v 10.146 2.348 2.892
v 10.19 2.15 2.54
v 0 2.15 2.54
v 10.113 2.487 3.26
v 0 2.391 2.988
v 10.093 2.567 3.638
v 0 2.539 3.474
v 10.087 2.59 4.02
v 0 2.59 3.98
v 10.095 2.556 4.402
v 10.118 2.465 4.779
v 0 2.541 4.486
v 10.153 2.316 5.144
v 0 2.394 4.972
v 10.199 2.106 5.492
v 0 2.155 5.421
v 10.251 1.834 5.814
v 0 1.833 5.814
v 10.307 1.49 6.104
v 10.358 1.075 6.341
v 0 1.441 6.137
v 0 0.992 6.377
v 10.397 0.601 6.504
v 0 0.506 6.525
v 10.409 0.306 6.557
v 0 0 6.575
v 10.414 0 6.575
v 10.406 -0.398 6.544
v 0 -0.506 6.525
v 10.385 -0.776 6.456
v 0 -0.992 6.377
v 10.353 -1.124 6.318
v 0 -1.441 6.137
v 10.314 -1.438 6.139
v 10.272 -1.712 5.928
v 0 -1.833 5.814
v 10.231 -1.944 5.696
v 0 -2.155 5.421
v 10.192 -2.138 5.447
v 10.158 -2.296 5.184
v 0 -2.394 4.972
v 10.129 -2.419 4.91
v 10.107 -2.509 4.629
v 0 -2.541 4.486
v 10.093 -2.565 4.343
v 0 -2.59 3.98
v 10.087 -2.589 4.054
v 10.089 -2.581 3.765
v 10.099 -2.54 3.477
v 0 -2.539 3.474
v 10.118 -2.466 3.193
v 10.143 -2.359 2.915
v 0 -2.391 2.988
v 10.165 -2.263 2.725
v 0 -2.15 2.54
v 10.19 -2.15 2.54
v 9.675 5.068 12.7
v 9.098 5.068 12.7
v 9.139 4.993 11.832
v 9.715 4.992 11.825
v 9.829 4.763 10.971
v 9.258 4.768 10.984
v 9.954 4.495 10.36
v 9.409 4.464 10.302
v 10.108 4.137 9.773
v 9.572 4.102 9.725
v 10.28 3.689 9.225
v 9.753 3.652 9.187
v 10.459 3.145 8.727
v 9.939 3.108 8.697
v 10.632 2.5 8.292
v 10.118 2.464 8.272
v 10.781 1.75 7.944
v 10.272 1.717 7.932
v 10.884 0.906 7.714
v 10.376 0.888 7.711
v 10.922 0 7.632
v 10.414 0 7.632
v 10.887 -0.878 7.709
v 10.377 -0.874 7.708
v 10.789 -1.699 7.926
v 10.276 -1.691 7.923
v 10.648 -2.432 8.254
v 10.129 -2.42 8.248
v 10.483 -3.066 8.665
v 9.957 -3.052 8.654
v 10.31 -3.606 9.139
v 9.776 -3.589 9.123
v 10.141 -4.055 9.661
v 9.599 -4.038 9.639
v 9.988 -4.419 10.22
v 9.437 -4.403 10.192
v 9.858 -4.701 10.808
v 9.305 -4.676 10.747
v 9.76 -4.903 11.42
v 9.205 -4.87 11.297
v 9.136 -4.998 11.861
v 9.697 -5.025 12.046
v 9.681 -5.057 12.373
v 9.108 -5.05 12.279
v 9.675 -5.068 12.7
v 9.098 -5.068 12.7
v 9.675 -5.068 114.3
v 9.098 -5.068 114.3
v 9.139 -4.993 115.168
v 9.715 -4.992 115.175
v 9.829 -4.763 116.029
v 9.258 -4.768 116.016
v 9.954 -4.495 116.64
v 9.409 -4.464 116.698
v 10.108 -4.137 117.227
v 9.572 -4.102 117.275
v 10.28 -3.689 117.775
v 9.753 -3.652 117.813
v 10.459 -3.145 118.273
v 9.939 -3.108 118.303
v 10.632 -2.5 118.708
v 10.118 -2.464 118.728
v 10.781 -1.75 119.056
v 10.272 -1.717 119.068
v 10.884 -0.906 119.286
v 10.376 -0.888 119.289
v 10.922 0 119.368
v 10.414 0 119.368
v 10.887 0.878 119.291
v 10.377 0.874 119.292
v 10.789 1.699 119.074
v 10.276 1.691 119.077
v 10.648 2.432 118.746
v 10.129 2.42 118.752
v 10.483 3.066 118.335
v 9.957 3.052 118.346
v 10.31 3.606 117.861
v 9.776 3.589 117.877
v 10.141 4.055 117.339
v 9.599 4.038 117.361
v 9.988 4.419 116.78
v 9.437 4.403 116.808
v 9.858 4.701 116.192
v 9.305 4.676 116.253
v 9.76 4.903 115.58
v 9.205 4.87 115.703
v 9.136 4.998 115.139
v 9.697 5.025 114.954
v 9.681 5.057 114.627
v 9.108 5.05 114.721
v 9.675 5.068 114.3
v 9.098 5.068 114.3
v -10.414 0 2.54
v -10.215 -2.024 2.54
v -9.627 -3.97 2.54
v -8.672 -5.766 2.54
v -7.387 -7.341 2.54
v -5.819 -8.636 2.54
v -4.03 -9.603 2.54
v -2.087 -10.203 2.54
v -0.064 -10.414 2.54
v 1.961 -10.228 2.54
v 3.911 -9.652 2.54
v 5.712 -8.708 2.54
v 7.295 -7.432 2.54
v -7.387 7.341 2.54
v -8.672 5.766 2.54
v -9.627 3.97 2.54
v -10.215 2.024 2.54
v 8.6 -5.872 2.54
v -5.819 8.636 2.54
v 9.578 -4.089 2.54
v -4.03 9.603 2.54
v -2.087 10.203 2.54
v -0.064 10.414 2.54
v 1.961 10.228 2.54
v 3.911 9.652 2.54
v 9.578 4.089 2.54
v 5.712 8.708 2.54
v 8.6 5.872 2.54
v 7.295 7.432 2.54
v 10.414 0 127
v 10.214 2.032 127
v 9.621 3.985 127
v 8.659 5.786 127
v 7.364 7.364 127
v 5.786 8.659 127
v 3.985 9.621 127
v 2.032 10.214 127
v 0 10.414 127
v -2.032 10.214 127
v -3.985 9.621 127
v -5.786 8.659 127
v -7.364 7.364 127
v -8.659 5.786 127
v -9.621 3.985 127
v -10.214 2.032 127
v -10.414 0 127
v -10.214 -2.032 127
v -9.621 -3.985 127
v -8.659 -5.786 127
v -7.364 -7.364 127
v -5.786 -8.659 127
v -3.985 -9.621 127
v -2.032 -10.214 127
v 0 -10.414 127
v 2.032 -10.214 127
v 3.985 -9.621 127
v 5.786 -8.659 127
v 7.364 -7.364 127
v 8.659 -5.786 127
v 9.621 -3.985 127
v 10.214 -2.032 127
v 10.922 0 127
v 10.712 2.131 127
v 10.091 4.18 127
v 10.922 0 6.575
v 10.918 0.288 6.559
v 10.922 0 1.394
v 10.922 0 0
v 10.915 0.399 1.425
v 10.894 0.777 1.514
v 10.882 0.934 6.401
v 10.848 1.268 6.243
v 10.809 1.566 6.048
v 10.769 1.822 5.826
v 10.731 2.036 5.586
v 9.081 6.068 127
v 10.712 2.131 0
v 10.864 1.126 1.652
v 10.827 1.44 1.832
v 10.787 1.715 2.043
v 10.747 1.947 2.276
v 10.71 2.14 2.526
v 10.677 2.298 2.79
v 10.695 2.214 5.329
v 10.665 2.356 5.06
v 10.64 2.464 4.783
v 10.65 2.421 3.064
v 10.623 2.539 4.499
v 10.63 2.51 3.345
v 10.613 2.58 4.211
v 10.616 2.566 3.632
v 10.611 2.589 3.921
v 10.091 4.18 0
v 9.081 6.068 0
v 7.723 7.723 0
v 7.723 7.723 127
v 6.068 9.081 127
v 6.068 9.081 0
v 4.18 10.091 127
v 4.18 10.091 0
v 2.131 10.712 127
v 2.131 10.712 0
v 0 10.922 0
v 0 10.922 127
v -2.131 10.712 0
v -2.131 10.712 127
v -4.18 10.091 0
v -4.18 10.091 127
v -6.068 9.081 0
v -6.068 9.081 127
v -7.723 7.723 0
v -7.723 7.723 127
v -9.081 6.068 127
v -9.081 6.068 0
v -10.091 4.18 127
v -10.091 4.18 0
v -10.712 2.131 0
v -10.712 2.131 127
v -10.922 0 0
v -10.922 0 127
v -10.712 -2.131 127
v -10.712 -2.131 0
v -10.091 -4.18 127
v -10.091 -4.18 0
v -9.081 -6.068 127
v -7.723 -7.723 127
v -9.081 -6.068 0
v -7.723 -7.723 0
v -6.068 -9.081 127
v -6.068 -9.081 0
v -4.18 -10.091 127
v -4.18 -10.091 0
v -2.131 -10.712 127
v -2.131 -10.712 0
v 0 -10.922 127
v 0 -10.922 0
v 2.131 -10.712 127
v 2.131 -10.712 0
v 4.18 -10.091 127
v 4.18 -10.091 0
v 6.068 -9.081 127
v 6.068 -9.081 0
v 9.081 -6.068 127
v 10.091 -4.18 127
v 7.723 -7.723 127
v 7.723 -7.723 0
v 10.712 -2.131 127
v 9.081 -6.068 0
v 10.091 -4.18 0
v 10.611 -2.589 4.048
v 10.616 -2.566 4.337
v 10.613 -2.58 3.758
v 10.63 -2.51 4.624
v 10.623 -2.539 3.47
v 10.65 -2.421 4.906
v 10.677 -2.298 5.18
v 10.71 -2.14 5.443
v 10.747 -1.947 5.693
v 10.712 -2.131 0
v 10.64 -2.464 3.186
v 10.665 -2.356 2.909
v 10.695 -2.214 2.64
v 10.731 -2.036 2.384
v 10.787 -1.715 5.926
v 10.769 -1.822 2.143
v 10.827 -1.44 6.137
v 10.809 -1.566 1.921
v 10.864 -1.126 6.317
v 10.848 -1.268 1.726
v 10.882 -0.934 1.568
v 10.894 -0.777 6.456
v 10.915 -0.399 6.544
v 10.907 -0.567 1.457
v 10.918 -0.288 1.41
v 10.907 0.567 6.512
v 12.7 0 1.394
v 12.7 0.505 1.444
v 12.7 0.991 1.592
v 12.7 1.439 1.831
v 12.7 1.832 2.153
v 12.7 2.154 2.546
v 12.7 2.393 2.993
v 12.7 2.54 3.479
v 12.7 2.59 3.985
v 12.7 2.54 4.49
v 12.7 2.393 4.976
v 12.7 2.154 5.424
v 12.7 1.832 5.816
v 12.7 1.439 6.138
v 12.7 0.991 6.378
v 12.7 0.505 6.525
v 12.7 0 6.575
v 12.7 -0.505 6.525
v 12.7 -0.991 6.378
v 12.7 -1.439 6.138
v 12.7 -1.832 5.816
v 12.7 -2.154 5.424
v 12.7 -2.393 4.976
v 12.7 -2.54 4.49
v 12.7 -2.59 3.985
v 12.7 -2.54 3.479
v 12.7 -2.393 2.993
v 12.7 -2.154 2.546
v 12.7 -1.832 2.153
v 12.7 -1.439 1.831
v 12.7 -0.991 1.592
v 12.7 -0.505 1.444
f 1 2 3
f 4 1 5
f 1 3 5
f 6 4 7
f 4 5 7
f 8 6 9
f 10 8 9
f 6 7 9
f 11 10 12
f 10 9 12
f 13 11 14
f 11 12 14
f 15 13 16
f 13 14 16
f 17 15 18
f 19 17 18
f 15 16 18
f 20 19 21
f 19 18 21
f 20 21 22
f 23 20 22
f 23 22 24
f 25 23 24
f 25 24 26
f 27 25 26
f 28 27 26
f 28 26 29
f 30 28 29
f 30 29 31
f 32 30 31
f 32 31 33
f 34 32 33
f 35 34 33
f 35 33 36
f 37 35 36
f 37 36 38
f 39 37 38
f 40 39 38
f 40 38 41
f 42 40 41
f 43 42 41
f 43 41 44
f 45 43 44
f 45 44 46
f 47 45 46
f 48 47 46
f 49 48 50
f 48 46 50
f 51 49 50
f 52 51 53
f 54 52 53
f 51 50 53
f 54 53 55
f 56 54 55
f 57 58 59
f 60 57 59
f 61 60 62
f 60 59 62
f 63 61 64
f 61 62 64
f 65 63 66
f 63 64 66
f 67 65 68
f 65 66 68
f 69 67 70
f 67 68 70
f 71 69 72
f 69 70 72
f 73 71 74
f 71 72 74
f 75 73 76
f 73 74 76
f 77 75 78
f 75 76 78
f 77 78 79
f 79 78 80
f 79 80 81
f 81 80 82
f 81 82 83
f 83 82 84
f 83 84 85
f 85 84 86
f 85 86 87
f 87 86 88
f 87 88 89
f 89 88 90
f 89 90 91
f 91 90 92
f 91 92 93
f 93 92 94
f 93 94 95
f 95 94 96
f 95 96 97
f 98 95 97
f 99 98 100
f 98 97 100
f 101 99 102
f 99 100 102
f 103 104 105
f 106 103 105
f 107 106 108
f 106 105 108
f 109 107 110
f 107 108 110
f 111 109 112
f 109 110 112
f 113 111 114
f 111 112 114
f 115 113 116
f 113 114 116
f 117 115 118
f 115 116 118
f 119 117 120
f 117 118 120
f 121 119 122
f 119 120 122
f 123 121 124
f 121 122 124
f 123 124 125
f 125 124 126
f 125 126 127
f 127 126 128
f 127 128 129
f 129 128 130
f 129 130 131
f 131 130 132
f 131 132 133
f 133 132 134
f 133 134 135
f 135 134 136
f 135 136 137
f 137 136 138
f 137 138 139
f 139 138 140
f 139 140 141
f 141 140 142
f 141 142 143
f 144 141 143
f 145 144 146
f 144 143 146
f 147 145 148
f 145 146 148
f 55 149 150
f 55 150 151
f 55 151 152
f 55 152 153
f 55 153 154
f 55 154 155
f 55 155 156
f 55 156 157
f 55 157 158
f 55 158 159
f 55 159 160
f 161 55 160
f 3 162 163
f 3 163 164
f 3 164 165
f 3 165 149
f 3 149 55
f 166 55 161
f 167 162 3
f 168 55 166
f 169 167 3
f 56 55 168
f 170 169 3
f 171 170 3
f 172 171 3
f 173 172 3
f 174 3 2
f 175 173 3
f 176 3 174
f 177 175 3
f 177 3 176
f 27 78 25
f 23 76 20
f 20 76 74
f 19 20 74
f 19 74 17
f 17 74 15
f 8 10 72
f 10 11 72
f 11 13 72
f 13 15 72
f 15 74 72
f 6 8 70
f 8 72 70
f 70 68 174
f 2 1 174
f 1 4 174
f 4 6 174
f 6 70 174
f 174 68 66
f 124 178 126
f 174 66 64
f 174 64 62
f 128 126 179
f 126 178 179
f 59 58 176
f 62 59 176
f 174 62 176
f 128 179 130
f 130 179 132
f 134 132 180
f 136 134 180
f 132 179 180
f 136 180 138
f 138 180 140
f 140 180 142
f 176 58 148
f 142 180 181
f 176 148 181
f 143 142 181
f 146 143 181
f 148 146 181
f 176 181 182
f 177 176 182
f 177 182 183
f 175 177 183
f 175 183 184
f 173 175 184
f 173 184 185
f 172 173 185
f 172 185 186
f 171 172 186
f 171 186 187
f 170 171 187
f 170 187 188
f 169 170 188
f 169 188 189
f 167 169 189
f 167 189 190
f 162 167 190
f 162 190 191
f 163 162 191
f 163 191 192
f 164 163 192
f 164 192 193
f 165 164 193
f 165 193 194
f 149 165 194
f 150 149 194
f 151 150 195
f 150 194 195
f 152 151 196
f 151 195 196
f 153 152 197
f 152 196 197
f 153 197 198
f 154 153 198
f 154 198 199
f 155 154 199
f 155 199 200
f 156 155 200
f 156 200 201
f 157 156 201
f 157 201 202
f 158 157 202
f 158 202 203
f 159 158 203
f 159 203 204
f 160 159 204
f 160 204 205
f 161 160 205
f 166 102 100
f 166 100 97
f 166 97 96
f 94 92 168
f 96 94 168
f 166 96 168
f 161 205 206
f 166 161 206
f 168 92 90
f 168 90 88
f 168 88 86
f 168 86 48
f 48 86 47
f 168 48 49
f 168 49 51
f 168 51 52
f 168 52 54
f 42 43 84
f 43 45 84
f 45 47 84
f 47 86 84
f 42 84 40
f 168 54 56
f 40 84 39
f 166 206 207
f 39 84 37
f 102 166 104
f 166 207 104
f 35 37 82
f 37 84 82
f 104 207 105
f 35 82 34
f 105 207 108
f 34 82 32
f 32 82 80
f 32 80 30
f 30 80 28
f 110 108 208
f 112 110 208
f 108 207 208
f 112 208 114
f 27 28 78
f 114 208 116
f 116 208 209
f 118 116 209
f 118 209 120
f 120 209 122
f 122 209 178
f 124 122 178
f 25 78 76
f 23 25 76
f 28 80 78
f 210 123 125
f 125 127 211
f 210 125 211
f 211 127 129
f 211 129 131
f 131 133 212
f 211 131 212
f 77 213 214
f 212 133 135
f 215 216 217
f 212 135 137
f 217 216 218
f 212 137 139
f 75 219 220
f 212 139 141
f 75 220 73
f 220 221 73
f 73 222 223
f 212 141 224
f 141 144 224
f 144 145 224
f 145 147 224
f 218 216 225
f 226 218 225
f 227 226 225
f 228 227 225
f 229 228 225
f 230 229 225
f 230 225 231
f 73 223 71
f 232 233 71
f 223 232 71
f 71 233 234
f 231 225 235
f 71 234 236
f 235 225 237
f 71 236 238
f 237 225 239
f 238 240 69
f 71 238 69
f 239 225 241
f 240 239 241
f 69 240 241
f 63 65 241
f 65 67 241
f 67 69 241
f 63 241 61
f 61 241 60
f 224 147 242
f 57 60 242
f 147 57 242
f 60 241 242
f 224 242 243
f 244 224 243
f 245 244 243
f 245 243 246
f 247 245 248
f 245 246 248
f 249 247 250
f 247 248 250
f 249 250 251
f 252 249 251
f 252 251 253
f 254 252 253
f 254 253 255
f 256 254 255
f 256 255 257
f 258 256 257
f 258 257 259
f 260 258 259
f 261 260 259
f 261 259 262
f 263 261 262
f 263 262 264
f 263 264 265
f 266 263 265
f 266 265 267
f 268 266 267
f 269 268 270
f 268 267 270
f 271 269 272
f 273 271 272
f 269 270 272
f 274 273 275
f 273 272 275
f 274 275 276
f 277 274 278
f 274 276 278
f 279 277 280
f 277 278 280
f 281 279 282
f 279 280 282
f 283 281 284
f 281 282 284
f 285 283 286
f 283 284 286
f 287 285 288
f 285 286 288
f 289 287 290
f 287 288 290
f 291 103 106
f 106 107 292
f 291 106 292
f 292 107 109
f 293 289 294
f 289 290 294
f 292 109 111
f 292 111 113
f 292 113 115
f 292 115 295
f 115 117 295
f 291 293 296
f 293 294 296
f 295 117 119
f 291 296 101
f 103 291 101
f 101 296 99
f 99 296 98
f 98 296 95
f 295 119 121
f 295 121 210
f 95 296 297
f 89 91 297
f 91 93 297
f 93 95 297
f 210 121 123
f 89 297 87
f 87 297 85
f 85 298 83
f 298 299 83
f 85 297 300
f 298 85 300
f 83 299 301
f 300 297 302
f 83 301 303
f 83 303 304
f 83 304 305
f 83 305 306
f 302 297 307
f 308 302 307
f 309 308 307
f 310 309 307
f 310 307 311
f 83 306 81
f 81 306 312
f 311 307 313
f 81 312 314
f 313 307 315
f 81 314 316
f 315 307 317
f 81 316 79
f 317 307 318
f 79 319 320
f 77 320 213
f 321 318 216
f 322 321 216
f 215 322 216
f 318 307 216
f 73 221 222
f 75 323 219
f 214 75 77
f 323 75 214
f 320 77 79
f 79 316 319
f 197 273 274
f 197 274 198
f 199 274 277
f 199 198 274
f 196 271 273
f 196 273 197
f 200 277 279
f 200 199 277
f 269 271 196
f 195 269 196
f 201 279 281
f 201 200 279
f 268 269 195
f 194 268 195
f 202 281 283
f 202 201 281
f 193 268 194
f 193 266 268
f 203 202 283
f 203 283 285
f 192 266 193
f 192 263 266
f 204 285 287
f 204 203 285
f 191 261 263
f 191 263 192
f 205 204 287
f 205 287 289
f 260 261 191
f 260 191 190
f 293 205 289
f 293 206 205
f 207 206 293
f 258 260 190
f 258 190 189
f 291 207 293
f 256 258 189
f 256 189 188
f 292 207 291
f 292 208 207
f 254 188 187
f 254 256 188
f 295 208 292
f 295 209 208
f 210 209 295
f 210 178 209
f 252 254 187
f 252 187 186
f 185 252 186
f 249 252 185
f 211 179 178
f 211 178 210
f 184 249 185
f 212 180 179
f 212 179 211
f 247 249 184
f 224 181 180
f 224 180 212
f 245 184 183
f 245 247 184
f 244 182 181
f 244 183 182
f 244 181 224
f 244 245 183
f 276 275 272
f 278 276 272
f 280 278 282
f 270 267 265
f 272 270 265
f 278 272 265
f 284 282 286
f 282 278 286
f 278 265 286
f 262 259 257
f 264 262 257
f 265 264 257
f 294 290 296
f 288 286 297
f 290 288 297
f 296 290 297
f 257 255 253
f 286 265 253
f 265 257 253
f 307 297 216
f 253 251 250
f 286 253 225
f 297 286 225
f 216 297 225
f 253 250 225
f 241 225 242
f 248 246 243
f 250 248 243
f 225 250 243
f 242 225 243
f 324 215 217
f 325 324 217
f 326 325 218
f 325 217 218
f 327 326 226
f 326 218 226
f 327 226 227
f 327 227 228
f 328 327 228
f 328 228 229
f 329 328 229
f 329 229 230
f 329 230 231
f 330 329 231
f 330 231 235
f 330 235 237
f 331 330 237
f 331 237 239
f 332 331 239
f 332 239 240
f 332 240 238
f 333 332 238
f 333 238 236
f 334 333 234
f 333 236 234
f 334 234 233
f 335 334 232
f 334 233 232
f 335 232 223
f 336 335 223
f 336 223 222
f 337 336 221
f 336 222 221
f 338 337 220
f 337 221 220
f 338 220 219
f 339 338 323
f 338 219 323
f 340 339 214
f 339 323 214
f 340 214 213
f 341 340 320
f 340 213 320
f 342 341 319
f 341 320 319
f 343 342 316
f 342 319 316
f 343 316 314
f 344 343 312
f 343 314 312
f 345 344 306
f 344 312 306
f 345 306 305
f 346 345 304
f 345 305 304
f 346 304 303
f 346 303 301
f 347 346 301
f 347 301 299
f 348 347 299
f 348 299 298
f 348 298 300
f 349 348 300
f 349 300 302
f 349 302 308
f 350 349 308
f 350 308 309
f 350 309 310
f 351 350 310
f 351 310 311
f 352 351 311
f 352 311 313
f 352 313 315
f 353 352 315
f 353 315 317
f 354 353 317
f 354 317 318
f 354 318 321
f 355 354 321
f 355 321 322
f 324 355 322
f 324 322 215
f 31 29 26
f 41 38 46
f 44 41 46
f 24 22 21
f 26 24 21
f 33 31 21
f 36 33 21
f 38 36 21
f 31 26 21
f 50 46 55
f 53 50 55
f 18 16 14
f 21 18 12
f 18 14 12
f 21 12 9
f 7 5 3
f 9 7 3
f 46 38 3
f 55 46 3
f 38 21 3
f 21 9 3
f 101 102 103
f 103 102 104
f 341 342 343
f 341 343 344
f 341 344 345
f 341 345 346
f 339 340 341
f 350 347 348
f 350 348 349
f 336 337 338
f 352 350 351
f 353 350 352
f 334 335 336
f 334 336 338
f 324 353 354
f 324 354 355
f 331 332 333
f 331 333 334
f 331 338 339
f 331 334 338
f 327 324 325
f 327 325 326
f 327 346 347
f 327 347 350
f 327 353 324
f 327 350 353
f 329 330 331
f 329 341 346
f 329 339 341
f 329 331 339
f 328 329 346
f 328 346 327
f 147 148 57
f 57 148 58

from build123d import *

# Parameters (mm, degrees)
SKETCH1_R           = 10.922
BOSS_EXTRUDE1_DEPTH = 127
SKETCH2_R           = 10.414
CUT_EXTRUDE1_DEPTH  = 124.46
CUT_EXTRUDE2_DEPTH  = 15.24
SKETCH5_R           = 2.590245468
BOSS_EXTRUDE2_DEPTH = 12.7


with BuildPart() as part:
    # Sketch1 → Boss-Extrude1 (new body)
    with BuildSketch(Plane.XY):
        Circle(SKETCH1_R)
    extrude(amount=BOSS_EXTRUDE1_DEPTH)

    # Sketch2 → Cut-Extrude1 (cut)
    with BuildSketch(Plane.XY.offset(127)):
        Circle(SKETCH2_R)
    extrude(amount=-CUT_EXTRUDE1_DEPTH, mode=Mode.SUBTRACT)

    # Sketch4 → Cut-Extrude2 (cut)
    with BuildSketch(Plane(origin=(0, 0, 0), x_dir=(0, 0, -1), z_dir=(1, 0, 0))):
        with BuildLine():
            Line((-114.3, 5.067588244), (-12.7, 5.067588244))
            ThreePointArc((-12.7, 5.067588244), (-7.632411756, 0), (-12.7, -5.067588244))
            Line((-12.7, -5.067588244), (-114.3, -5.067588244))
            ThreePointArc((-114.3, -5.067588244), (-119.367588244, 0), (-114.3, 5.067588244))
        make_face()
    extrude(amount=CUT_EXTRUDE2_DEPTH, mode=Mode.SUBTRACT)

    # Sketch5 → Boss-Extrude2 (add)
    with BuildSketch(Plane(origin=(0, 0, 0), x_dir=(0, 0, -1), z_dir=(1, 0, 0))):
        with Locations((-3.984592514, 0)):
            Circle(SKETCH5_R)
    extrude(amount=BOSS_EXTRUDE2_DEPTH)


solid = part.part
